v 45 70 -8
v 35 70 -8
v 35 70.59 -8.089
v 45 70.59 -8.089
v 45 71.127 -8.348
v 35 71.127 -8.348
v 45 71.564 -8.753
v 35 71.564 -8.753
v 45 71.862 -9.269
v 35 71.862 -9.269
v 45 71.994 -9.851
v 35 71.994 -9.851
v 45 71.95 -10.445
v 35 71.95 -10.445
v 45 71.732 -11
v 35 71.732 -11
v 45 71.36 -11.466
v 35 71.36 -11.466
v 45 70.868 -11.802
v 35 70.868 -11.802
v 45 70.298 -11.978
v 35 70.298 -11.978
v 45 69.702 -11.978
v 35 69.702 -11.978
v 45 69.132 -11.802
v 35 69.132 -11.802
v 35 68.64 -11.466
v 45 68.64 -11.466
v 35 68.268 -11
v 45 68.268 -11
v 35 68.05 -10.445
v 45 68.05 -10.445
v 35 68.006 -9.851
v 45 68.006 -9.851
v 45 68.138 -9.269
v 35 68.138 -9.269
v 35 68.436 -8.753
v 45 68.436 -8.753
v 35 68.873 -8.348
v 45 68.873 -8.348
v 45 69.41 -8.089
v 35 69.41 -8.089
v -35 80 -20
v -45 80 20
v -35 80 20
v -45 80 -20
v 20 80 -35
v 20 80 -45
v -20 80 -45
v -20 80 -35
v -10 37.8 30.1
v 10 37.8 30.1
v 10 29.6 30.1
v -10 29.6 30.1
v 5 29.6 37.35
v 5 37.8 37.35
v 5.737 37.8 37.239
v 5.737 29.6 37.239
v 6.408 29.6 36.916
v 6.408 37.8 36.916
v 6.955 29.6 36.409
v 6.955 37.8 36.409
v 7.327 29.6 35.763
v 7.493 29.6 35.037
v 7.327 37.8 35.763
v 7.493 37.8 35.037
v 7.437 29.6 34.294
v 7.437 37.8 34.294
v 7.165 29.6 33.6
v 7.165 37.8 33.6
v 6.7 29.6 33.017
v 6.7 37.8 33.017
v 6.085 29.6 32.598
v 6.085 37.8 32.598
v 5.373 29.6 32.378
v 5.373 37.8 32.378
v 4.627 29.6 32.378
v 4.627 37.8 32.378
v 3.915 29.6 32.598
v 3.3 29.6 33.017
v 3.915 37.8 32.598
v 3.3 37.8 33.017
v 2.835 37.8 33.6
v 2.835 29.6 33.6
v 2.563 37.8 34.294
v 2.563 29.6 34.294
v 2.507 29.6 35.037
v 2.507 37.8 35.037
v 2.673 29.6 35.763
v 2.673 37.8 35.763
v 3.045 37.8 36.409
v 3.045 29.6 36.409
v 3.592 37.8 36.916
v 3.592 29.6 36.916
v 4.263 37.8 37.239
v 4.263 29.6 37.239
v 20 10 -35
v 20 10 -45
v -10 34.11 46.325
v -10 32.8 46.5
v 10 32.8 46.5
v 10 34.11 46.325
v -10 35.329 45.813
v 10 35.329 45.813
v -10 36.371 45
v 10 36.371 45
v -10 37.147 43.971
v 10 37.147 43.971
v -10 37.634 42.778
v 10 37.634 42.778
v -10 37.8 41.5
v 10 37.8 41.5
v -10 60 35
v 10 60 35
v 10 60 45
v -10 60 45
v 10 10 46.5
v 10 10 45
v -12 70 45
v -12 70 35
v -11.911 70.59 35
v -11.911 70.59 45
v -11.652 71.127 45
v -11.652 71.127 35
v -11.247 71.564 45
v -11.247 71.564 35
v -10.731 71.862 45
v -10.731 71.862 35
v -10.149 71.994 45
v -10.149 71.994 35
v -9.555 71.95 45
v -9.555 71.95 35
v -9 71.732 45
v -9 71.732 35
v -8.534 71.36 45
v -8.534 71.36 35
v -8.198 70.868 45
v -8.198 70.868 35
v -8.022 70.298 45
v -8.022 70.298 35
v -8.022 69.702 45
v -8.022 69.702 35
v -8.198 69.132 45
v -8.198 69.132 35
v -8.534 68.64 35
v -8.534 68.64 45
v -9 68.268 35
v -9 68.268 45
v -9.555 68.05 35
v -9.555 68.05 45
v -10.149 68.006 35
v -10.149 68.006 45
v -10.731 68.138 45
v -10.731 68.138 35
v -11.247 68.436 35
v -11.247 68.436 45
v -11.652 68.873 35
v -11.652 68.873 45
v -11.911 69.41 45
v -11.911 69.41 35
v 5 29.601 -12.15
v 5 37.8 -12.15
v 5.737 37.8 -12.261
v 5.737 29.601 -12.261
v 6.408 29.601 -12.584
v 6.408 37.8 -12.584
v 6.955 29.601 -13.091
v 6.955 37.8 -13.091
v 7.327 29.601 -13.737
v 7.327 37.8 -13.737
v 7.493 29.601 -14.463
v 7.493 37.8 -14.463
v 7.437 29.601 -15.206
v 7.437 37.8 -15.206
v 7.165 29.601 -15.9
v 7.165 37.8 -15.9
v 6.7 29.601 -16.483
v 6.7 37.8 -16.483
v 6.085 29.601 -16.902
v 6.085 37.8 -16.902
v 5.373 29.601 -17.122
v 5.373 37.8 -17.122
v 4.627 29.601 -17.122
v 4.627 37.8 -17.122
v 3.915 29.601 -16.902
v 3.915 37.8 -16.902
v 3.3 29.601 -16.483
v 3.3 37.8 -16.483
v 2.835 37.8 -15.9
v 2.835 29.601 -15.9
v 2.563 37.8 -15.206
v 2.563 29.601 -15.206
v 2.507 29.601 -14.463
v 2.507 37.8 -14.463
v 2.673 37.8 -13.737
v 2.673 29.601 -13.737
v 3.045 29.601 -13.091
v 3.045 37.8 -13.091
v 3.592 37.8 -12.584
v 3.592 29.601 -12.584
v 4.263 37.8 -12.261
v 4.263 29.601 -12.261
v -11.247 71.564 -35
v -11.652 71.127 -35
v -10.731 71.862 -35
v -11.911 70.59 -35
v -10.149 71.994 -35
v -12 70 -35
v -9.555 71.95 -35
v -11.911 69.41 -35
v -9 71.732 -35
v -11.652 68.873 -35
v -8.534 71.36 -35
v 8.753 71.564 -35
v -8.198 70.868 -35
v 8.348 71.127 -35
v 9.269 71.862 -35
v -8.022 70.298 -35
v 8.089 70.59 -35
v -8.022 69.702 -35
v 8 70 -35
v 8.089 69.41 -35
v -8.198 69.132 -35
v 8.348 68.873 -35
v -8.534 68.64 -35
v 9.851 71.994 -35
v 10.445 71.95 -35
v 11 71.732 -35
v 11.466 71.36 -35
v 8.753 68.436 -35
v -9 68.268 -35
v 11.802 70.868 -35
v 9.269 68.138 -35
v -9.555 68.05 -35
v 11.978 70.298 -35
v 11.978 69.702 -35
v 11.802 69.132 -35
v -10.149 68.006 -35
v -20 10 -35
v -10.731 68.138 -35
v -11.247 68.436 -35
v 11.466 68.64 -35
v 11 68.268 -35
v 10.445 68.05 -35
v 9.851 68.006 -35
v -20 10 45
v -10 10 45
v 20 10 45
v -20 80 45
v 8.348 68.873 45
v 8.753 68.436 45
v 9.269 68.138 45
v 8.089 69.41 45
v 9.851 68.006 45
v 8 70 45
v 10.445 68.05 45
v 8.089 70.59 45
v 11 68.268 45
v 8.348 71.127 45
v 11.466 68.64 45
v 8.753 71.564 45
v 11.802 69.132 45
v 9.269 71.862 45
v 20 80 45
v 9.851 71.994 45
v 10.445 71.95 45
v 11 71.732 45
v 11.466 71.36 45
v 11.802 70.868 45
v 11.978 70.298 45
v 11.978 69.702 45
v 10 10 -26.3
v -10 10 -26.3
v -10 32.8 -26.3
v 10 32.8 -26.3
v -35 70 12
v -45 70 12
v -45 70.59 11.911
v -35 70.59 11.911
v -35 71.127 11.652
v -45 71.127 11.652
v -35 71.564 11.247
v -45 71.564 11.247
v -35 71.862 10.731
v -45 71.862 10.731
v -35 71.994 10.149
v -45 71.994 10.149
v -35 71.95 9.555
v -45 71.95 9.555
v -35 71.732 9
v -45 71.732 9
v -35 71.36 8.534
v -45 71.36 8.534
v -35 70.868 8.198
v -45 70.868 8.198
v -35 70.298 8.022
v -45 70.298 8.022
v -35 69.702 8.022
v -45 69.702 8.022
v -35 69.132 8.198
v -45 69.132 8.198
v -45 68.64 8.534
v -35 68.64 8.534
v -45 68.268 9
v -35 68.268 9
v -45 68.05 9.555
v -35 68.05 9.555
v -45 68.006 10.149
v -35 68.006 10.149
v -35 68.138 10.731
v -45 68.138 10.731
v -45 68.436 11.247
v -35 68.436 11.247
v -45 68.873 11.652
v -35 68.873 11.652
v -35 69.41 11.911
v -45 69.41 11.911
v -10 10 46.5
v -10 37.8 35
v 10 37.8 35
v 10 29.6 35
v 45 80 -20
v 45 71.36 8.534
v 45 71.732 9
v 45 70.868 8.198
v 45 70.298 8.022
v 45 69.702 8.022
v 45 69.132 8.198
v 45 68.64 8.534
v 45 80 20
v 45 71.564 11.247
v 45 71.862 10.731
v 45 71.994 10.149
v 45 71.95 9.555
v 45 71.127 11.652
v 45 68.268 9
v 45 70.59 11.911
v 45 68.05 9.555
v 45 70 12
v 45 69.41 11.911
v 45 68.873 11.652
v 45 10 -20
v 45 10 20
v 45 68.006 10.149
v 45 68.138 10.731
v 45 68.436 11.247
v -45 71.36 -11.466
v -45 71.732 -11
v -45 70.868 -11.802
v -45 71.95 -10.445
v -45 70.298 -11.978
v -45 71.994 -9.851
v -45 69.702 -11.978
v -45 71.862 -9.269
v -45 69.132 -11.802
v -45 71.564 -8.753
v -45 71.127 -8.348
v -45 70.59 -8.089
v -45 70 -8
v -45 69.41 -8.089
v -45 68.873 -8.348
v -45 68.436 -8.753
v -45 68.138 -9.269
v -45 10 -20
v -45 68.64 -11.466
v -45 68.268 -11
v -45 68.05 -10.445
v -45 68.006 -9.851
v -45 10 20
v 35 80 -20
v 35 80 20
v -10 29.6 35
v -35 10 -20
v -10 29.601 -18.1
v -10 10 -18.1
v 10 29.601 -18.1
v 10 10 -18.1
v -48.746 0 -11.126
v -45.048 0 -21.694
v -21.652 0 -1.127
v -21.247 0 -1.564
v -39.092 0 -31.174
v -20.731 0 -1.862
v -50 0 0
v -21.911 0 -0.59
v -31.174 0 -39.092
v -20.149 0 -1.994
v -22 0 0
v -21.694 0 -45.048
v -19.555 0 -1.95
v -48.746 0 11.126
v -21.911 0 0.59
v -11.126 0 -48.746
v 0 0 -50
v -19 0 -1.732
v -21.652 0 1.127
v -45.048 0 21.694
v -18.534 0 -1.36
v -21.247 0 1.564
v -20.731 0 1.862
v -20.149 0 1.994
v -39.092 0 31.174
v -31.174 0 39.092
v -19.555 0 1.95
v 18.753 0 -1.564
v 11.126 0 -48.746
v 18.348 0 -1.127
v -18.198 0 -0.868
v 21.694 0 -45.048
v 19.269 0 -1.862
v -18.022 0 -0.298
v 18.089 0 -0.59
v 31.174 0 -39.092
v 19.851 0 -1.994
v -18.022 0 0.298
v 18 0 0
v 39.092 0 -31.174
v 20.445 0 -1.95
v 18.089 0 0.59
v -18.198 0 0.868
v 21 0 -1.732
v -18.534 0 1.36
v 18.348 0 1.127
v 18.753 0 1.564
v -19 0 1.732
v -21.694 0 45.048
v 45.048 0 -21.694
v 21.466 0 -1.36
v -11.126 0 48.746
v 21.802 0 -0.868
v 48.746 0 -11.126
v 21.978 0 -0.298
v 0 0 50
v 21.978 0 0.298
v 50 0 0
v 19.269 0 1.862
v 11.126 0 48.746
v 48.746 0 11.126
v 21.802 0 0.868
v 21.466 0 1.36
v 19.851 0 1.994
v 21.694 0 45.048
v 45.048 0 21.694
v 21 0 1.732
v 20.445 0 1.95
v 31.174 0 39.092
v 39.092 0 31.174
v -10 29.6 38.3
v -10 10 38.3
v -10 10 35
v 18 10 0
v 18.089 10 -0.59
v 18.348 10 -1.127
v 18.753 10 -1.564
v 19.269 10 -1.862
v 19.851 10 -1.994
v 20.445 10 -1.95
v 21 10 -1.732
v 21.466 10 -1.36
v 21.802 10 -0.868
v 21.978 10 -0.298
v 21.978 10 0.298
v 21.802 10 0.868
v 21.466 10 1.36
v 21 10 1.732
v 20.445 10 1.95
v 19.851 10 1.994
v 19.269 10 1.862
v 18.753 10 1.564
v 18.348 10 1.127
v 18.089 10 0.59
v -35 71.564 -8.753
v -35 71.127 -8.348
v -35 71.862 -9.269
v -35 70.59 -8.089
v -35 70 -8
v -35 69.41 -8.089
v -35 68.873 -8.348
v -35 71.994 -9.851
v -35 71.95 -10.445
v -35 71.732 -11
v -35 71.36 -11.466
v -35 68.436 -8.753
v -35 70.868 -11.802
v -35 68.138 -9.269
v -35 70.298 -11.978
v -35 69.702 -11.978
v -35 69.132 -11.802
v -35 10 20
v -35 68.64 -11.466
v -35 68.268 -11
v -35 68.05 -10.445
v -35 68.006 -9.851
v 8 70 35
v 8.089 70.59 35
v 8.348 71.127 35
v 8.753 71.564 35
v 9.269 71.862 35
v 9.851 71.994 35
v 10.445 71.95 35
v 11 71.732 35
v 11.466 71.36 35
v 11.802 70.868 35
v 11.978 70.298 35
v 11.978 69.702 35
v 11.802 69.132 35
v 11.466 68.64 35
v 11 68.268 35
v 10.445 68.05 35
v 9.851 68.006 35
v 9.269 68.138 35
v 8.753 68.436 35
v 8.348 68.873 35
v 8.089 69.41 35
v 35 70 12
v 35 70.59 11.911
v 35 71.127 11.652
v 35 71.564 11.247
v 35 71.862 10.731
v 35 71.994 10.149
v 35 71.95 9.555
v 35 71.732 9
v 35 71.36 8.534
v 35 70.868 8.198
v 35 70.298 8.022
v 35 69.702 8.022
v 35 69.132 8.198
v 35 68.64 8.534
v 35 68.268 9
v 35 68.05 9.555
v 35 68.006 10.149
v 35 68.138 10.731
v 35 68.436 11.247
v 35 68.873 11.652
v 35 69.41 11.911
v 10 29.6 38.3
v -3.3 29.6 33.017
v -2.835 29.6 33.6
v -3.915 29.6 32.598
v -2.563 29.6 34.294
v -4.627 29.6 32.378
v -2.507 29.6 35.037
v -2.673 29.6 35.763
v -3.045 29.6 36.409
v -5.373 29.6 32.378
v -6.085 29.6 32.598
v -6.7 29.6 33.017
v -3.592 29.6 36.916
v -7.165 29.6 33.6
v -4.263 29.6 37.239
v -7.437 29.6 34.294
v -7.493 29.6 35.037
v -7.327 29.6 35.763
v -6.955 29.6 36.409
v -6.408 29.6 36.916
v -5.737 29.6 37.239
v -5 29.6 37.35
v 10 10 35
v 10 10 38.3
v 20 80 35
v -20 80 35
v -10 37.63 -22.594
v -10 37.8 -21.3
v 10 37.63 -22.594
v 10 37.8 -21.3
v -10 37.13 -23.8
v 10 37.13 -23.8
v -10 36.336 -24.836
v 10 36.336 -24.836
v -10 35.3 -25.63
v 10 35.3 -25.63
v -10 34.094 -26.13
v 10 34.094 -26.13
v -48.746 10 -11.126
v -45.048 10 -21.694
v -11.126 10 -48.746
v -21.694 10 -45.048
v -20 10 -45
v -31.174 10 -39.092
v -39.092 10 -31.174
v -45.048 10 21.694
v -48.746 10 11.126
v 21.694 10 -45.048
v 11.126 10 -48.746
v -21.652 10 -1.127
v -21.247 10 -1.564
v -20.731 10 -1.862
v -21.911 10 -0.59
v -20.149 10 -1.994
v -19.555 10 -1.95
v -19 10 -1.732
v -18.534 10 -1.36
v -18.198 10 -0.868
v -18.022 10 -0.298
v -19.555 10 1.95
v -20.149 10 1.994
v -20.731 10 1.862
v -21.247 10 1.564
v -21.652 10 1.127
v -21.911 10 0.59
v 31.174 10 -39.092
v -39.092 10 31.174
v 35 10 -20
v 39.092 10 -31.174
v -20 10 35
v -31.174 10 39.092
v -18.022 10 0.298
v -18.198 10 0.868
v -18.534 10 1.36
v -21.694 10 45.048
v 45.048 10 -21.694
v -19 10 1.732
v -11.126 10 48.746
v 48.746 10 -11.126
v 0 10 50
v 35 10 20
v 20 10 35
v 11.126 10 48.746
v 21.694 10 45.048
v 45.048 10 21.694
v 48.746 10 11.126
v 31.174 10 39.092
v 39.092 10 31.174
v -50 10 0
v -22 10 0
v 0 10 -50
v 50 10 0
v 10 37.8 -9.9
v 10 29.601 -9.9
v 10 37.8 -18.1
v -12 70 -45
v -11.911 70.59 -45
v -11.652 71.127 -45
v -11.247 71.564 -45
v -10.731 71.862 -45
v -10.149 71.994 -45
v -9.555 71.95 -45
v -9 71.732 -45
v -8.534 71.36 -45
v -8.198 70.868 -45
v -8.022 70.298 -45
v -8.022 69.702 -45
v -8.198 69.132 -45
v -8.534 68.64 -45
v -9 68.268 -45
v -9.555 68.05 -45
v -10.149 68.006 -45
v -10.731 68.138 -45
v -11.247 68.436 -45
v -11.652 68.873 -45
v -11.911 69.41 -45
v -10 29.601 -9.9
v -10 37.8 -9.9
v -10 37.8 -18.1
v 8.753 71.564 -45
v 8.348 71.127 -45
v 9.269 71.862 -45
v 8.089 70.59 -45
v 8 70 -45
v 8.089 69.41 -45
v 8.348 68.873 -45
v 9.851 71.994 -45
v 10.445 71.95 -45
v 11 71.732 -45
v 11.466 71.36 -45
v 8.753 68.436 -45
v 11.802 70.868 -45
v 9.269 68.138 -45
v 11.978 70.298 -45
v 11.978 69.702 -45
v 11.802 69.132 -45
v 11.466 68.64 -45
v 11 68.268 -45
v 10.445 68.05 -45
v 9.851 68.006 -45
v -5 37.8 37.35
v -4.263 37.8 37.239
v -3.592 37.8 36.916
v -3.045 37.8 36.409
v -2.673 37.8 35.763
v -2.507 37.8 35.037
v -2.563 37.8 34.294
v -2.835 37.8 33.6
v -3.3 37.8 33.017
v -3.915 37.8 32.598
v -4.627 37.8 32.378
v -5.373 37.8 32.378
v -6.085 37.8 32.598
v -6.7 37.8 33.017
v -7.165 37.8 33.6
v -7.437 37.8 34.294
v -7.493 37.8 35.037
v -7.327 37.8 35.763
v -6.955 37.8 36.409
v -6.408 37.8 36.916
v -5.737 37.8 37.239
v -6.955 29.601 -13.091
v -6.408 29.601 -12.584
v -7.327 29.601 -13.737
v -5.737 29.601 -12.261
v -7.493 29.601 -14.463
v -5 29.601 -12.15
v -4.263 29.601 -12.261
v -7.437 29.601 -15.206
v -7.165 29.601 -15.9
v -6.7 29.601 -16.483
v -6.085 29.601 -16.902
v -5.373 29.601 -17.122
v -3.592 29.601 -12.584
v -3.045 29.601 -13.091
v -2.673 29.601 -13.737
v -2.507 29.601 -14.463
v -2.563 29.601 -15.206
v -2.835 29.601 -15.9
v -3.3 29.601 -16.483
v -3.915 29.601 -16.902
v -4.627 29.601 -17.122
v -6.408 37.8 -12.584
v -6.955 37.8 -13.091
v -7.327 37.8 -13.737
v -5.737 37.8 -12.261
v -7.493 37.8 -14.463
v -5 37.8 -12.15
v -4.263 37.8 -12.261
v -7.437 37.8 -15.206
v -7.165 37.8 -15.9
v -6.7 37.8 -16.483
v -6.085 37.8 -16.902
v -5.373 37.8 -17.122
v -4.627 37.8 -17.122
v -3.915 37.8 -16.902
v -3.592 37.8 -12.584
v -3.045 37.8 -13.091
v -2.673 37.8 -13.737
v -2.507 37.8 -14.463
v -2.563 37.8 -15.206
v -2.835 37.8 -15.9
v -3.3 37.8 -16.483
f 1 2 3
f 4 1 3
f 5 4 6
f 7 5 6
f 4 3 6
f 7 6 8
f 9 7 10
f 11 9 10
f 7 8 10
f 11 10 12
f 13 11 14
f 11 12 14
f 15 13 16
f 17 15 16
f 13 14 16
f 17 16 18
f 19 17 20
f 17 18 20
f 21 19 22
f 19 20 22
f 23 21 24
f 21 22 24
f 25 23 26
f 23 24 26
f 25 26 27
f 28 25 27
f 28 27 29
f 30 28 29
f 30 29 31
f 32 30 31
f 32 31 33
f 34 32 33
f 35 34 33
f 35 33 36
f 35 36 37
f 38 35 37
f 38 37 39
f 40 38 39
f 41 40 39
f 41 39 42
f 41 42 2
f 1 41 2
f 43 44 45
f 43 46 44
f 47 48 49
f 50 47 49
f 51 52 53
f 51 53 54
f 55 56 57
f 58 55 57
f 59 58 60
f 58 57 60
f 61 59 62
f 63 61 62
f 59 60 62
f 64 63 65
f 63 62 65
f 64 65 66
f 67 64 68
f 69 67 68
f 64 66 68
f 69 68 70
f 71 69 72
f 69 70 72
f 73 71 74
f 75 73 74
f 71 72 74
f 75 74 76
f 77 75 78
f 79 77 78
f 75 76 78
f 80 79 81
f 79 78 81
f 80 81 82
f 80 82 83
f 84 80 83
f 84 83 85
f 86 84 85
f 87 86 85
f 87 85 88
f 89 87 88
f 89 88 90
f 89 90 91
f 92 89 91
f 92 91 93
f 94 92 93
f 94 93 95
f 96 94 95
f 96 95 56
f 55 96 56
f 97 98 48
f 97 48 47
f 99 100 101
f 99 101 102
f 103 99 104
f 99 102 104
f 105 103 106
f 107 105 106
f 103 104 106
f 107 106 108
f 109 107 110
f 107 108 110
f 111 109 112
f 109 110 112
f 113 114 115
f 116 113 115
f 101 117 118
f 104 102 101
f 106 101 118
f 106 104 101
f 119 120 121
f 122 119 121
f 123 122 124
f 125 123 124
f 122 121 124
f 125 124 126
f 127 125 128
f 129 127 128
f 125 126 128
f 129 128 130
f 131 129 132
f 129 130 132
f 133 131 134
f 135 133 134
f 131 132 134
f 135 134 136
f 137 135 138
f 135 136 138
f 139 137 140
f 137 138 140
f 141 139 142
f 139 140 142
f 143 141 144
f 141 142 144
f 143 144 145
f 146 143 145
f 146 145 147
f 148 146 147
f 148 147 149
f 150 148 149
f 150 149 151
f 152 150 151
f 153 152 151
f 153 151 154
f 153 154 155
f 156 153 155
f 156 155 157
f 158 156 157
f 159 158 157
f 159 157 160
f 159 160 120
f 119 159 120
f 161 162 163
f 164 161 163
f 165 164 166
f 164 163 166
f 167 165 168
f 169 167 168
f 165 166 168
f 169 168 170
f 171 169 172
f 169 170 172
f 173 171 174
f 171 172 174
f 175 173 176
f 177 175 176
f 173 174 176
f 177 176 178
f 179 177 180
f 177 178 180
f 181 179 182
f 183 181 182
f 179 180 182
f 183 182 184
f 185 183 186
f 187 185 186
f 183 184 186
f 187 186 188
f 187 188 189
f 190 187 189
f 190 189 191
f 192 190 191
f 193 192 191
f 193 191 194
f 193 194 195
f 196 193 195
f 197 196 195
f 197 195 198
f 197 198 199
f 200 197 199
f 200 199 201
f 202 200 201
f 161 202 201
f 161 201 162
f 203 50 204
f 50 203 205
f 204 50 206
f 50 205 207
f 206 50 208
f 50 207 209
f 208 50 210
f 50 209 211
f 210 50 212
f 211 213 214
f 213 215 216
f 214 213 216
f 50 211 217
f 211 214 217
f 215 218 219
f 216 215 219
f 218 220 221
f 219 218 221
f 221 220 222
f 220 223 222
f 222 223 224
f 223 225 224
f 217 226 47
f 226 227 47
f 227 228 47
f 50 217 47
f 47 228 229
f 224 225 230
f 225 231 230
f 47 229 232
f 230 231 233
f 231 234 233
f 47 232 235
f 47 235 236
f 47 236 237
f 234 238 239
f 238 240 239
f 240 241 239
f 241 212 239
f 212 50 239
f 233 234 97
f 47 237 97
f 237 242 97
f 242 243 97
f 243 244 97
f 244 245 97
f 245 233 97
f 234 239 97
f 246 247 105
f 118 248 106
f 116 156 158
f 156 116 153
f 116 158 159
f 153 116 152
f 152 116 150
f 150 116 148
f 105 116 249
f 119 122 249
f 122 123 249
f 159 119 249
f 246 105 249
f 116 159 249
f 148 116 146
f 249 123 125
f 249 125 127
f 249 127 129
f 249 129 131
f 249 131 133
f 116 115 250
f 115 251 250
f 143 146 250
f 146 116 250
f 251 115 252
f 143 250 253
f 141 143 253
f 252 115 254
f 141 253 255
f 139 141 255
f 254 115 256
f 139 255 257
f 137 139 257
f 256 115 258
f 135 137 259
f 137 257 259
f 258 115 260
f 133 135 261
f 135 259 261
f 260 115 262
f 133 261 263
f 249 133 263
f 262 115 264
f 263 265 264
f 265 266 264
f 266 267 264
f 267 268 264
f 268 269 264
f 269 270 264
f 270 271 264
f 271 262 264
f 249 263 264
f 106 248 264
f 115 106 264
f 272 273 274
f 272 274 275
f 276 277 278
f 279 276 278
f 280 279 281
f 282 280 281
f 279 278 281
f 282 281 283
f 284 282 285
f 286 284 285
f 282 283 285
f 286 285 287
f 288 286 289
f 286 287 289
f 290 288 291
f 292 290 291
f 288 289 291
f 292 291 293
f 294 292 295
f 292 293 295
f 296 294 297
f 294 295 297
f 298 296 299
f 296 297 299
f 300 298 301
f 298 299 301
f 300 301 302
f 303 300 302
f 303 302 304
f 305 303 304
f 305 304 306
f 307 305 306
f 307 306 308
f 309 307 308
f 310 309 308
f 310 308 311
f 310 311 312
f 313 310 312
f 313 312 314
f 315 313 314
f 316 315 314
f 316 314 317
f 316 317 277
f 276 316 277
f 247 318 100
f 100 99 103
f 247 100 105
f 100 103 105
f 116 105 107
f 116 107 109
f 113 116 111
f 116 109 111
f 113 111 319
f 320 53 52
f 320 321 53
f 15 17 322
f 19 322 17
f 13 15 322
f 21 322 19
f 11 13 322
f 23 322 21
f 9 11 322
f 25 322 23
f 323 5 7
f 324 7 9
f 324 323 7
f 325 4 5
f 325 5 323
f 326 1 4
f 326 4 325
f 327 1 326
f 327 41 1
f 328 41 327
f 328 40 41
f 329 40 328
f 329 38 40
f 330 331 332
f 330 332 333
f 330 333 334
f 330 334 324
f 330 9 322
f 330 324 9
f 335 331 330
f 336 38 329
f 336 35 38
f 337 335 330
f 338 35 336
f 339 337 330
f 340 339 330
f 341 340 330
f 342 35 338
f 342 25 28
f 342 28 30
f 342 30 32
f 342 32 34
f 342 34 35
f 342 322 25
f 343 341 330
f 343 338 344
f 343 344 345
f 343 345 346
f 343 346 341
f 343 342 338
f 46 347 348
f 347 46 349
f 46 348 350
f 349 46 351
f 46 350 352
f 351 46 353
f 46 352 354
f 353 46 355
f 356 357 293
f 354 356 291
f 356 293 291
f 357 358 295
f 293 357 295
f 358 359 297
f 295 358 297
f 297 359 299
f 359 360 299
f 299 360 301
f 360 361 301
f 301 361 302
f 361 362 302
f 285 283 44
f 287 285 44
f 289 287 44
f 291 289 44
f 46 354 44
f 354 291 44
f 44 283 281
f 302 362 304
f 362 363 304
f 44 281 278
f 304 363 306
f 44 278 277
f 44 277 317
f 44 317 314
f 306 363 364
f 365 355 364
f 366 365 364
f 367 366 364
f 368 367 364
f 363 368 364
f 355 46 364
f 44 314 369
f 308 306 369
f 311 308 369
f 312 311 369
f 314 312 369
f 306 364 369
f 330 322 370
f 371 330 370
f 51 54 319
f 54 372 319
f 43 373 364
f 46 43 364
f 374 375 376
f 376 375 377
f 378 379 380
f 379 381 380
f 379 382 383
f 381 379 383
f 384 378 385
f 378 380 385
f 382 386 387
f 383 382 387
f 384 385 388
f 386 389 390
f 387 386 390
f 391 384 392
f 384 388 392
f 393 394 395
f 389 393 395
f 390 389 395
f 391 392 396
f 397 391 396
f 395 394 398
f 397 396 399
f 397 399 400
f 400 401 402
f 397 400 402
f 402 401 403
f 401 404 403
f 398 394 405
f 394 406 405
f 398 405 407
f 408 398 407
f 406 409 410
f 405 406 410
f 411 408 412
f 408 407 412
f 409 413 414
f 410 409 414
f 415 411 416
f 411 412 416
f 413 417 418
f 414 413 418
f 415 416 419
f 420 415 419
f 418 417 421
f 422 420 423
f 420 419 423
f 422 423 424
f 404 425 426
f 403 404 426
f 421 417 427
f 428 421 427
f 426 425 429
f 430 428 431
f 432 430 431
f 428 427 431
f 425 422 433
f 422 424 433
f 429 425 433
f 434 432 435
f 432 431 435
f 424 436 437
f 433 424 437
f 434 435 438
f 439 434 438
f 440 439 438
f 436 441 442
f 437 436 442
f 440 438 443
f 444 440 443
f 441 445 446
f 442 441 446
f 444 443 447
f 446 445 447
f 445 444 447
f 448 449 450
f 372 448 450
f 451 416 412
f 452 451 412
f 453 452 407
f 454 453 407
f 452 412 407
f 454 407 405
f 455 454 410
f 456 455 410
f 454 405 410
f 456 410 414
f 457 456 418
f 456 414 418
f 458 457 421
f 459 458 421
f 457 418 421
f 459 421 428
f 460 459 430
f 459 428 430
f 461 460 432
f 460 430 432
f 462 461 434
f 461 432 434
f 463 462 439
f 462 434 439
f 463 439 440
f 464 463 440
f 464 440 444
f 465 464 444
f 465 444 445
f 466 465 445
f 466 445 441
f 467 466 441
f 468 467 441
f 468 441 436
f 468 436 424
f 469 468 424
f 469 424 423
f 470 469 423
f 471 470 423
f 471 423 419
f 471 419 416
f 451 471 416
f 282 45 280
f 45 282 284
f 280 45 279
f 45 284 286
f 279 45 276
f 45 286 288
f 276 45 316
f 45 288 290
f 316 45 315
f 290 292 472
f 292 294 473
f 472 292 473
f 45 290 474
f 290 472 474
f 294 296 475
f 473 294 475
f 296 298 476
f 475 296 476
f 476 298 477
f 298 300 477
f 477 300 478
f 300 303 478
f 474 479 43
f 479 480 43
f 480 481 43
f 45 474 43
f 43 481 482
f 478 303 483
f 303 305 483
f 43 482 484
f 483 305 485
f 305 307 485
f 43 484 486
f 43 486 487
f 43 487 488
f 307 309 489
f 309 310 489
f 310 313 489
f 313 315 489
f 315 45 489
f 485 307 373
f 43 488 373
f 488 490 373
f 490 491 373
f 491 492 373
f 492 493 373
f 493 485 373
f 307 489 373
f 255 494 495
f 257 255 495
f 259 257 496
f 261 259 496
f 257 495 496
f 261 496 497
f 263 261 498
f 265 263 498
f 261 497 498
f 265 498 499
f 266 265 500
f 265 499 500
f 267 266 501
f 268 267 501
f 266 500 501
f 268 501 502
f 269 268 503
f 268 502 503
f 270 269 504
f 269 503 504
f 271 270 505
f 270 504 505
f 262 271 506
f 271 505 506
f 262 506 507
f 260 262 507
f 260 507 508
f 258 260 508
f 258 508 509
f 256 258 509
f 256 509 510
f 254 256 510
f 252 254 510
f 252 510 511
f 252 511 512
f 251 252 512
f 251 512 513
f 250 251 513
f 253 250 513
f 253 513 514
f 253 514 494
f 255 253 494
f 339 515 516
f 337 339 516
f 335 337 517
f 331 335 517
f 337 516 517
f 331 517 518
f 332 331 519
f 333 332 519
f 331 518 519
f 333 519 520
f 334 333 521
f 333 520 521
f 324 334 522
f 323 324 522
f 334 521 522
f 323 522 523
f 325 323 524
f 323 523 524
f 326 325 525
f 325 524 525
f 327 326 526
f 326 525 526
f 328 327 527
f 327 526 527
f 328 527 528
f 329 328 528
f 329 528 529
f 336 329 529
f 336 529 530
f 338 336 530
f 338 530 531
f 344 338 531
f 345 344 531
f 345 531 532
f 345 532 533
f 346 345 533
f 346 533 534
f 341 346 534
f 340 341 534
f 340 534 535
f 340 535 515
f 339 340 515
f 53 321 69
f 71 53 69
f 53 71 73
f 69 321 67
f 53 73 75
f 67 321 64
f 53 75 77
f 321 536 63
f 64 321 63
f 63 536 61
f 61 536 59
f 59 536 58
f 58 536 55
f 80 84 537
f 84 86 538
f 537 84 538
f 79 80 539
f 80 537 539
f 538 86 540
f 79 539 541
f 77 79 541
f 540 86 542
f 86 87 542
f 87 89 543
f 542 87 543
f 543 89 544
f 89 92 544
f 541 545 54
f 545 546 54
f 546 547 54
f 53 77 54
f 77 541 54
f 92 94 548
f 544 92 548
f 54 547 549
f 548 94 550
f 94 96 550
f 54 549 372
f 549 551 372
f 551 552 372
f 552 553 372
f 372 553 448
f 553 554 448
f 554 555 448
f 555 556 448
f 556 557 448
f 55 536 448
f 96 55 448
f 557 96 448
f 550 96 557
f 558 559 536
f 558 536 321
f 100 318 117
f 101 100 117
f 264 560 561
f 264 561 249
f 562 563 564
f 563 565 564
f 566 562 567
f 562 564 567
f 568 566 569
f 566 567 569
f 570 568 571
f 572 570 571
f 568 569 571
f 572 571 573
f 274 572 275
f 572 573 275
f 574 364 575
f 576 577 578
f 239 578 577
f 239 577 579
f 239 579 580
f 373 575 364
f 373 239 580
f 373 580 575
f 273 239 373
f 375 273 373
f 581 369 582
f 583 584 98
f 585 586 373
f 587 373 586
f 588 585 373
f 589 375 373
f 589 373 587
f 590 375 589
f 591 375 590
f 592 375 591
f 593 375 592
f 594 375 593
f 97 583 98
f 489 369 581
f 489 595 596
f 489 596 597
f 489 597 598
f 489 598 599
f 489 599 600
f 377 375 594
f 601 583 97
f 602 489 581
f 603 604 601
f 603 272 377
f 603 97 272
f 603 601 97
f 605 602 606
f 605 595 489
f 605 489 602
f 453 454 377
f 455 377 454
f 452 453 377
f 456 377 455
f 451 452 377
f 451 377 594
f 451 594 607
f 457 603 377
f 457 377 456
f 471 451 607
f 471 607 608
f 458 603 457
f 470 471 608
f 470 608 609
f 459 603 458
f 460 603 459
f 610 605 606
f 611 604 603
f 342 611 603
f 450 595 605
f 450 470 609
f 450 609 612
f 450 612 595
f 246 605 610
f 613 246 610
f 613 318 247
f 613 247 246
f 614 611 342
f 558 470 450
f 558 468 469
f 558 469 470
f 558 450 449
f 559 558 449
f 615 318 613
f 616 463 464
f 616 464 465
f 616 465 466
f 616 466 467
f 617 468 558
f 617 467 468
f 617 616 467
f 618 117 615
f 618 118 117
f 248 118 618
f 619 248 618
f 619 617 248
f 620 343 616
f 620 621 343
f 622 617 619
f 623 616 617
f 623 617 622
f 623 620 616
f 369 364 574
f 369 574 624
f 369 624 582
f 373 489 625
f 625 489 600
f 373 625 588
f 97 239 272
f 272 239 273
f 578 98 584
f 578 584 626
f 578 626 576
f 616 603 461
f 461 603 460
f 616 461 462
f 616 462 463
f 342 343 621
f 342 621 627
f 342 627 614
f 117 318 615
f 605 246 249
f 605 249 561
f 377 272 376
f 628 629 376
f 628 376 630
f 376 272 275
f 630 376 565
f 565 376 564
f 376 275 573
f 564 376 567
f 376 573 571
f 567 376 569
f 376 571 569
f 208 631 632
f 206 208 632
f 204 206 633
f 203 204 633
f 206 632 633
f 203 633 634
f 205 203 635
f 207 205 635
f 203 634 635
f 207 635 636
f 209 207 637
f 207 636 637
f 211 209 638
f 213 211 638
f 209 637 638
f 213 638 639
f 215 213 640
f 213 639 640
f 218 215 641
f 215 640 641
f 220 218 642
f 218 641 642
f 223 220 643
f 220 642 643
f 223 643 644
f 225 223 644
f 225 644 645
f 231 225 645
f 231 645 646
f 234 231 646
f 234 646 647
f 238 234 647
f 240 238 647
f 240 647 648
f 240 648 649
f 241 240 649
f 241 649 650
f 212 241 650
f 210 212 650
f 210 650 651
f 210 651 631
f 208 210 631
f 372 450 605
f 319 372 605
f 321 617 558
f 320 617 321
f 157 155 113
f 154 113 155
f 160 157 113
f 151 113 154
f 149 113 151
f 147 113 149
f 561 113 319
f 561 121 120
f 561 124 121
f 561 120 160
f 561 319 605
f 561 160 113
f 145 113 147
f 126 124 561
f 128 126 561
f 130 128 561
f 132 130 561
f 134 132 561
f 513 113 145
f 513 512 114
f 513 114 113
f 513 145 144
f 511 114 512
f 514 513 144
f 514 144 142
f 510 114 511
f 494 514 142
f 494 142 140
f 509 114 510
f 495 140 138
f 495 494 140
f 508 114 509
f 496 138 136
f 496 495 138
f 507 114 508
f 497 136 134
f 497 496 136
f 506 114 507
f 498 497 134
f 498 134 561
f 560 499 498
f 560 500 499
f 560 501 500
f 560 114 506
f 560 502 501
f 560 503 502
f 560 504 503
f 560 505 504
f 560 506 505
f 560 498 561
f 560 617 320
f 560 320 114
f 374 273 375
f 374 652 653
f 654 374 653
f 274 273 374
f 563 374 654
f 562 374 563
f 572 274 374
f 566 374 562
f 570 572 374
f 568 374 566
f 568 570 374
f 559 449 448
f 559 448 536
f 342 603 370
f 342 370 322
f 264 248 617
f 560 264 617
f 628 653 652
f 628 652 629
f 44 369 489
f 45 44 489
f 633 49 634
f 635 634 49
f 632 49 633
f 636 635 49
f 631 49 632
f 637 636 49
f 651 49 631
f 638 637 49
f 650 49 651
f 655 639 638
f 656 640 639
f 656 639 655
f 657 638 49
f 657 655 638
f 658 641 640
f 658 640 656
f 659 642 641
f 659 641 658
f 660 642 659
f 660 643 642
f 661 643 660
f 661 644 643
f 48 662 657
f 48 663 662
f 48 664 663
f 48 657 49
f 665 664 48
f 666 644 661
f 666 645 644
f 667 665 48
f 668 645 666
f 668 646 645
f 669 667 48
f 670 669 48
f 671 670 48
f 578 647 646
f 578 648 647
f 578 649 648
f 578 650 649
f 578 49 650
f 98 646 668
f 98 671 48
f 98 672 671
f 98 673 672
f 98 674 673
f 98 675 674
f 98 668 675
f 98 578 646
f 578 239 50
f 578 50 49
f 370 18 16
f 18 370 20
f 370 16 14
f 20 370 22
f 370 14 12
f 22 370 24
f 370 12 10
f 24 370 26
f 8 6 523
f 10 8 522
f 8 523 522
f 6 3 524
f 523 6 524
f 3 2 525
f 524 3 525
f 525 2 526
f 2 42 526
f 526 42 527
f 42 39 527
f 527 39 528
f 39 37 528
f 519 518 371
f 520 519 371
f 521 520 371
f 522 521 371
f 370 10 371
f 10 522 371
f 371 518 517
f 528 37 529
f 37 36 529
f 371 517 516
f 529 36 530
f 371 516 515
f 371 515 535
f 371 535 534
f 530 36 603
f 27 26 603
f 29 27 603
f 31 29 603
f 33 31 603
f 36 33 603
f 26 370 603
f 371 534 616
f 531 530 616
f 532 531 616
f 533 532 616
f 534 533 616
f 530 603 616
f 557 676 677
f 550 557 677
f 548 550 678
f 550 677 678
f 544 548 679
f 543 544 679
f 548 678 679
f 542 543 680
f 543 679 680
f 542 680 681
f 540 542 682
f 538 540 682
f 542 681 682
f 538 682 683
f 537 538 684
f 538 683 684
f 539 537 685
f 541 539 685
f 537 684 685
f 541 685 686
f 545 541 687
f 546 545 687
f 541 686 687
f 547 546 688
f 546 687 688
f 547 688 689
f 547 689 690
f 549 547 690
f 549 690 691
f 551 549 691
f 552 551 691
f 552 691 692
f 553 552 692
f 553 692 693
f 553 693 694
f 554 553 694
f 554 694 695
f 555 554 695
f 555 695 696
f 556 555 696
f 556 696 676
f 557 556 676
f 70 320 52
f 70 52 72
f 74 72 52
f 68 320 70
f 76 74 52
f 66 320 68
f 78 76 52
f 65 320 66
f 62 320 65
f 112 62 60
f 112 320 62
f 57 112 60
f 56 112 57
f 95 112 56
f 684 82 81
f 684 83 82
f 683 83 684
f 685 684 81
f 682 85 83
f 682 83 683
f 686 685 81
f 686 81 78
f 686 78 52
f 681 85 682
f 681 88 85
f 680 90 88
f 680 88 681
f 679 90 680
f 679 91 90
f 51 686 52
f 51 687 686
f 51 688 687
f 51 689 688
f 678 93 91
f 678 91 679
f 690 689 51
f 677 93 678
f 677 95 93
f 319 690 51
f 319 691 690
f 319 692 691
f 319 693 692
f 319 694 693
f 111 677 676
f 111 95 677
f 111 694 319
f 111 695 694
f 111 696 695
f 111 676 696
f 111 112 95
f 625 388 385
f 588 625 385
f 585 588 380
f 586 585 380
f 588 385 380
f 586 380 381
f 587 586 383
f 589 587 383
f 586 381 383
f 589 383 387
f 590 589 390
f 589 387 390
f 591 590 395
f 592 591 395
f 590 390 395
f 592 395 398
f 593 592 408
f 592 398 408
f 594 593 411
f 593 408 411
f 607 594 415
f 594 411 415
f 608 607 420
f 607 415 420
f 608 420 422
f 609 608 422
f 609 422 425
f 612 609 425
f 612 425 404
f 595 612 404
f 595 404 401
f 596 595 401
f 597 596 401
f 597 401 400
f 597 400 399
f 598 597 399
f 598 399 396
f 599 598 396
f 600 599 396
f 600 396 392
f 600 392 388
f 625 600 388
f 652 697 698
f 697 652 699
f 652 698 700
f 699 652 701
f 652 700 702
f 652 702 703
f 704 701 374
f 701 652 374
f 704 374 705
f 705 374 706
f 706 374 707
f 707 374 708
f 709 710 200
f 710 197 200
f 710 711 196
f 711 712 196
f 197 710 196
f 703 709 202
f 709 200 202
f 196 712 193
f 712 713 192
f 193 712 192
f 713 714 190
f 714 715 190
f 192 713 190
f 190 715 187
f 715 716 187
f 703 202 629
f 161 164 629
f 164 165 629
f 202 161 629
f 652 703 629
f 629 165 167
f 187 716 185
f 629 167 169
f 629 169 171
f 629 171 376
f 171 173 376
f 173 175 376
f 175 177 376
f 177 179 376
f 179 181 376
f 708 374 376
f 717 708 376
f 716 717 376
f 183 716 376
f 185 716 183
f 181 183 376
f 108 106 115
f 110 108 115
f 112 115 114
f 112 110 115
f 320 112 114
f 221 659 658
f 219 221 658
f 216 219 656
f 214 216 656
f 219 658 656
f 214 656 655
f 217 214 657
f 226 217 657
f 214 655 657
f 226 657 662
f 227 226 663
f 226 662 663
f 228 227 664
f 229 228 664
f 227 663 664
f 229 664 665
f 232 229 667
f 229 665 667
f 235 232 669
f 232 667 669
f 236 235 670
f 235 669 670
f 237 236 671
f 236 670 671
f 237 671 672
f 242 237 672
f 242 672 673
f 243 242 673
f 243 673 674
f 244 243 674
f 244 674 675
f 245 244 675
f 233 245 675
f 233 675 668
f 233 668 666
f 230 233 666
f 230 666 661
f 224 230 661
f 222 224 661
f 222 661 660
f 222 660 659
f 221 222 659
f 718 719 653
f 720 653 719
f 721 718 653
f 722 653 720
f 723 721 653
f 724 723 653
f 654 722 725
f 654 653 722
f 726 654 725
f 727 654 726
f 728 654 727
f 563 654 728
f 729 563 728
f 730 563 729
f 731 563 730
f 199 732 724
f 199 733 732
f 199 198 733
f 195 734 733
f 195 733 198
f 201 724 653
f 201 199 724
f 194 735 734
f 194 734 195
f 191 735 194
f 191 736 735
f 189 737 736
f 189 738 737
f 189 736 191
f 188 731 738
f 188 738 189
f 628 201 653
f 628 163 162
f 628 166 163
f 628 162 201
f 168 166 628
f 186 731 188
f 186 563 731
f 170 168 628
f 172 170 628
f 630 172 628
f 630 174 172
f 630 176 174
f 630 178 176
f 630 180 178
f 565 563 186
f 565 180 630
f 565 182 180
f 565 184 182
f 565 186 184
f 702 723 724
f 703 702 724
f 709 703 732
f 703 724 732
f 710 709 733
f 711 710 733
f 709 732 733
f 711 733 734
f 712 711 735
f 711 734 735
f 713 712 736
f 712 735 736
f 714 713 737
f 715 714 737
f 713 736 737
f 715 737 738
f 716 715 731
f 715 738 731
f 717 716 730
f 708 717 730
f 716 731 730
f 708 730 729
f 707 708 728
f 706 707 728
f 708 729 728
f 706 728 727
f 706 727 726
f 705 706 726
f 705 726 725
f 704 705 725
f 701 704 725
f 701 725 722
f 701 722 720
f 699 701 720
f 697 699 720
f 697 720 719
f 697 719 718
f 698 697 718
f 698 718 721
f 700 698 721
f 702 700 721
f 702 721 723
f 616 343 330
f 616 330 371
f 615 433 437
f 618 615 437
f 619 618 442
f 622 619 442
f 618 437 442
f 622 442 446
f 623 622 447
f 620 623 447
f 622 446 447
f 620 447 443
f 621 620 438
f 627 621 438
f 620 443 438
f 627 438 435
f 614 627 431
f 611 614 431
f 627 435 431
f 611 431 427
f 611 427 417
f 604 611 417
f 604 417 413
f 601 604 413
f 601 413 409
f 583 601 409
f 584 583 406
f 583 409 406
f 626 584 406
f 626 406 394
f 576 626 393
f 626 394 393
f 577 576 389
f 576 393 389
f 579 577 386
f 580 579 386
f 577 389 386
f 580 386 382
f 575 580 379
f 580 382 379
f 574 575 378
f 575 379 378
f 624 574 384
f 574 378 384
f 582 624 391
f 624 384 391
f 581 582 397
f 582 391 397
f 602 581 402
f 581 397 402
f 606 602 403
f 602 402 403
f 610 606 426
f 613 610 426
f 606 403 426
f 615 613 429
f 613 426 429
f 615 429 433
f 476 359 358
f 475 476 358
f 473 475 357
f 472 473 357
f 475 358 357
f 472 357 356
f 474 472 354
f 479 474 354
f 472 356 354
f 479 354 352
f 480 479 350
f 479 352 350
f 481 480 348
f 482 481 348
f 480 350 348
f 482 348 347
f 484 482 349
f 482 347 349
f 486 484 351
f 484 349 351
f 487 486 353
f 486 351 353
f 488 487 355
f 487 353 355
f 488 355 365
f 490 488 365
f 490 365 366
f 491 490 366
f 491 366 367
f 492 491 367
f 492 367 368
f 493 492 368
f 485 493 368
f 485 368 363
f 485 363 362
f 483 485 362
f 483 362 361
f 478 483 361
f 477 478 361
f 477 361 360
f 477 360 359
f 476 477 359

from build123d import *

# Parameters (mm, degrees)
SKETCH1_R                = 50
BOSS_EXTRUDE1_DEPTH      = 10
SKETCH2_W                = 20
SKETCH2_H                = 8.2
BOSS_EXTRUDE2_DEPTH      = 27.8
SKETCH3_W                = 20
SKETCH3_H                = 8.2
BOSS_EXTRUDE3_DEPTH      = 8.2
SKETCH4_W                = 20
SKETCH4_H                = 8.199243263
BOSS_EXTRUDE4_DEPTH      = 8.2
FILLET1_R                = 5
SKETCH7_R                = 2.5
CUT_EXTRUDE1_DEPTH       = 9
SKETCH5_W                = 10
SKETCH5_H                = 10
BOSS_EXTRUDE5_DEPTH      = 70
BOSS_EXTRUDE6_REACH      = 113.803
SKETCH8_W                = 10
SKETCH8_H                = 20
F_4_0_4_DIAMETER_HOLE1_D = 4
F_4_0_4_DIAMETER_HOLE2_D = 4
F_4_0_4_DIAMETER_HOLE3_D = 4


with BuildPart() as part:
    # Sketch1 → Boss-Extrude1 (new body)
    with BuildSketch(Plane(origin=(0, 0, 0), x_dir=(1, 0, 0), z_dir=(0, 1, 0))):
        with Locations(Location((0, 0, 0), (0, 0, 270))):
            Circle(SKETCH1_R)
    extrude(amount=BOSS_EXTRUDE1_DEPTH)

    # Sketch2 → Boss-Extrude2 (add)
    with BuildSketch(Plane(origin=(0, 10, 0), x_dir=(1, 0, 0), z_dir=(0, 1, 0))):
        with Locations((0, -42.4)):
            Rectangle(SKETCH2_W, SKETCH2_H)
        with Locations((0, 22.2)):
            Rectangle(SKETCH2_W, SKETCH2_H)
    extrude(amount=BOSS_EXTRUDE2_DEPTH)

    # Sketch3 → Boss-Extrude3 (add)
    with BuildSketch(Plane(origin=(0, 0, 38.3), x_dir=(-1, 0, 0), z_dir=(0, 0, -1))):
        with Locations((0, 33.7)):
            Rectangle(SKETCH3_W, SKETCH3_H)
    extrude(amount=BOSS_EXTRUDE3_DEPTH)

    # Sketch4 → Boss-Extrude4 (add)
    with BuildSketch(Plane.XY.offset(-18.1)):
        with Locations((0, 33.700378369)):
            Rectangle(SKETCH4_W, SKETCH4_H)
    extrude(amount=BOSS_EXTRUDE4_DEPTH)

    # Fillet1
    fillet1_edges = [part.edges().sort_by_distance(p)[0] for p in [
        (0, 37.8, -26.3),
        (0, 37.8, 46.5),
    ]]
    fillet(fillet1_edges, radius=FILLET1_R)

    # Sketch7 → Cut-Extrude1 (cut)
    with BuildSketch(Plane(origin=(0, 37.8, 0), x_dir=(1, 0, 0), z_dir=(0, 1, 0))):
        with Locations(Location((5, 14.65, 0), (0, 0, 270))):
            Circle(SKETCH7_R)
        with Locations(Location((-5, 14.65, 0), (0, 0, 270))):
            Circle(SKETCH7_R)
        with Locations(Location((-5, -34.85, 0), (0, 0, 270))):
            Circle(SKETCH7_R)
        with Locations(Location((5, -34.85, 0), (0, 0, 270))):
            Circle(SKETCH7_R)
    extrude(amount=-CUT_EXTRUDE1_DEPTH, mode=Mode.SUBTRACT)

    # Sketch5 → Boss-Extrude5 (add)
    with BuildSketch(Plane(origin=(0, 10, 0), x_dir=(1, 0, 0), z_dir=(0, 1, 0))):
        Polygon((35, 0), (35, 20), (45, 20), (45, -20), (35, -20), align=None)
        Polygon((-45, -20), (-35, -20), (-35, 0), (-35, 20), (-45, 20), align=None)
        with Locations((-15, -40)):
            Rectangle(SKETCH5_W, SKETCH5_H)
        with Locations((15, -40)):
            Rectangle(SKETCH5_W, SKETCH5_H)
        Polygon((-20, 35), (-20, 45), (20, 45), (20, 35), (0, 35), align=None)
    extrude(amount=BOSS_EXTRUDE5_DEPTH)

    # Sketch8 → Boss-Extrude6 (add, up to next)
    with BuildSketch(Plane.ZY.offset(-10), mode=Mode.PRIVATE) as boss_extrude6_sk1:
        with Locations((40, 70)):
            Rectangle(SKETCH8_W, SKETCH8_H)
    boss_extrude6_tool1 = extrude(boss_extrude6_sk1.sketch, amount=BOSS_EXTRUDE6_REACH, mode=Mode.PRIVATE) - part.part
    add(boss_extrude6_tool1.solids().sort_by_distance((10, 70, 40))[0])

    # Ø4.0 (4) Diameter Hole1 (through all)
    with Locations(Plane.XY.offset(45)):
        with Locations((-10, 70), (10, 70)):
            Hole(F_4_0_4_DIAMETER_HOLE1_D / 2)

    # Ø4.0 (4) Diameter Hole2 (through all)
    with Locations(Plane(origin=(45, 0, 0), x_dir=(0, 0, -1), z_dir=(1, 0, 0))):
        with Locations((-10, 70), (10, 70)):
            Hole(F_4_0_4_DIAMETER_HOLE2_D / 2)

    # Ø4.0 (4) Diameter Hole3 (through all)
    with Locations(Plane(origin=(0, 10, 0), x_dir=(1, 0, 0), z_dir=(0, 1, 0))):
        with Locations((-20, 0), (20, 0)):
            Hole(F_4_0_4_DIAMETER_HOLE3_D / 2)


solid = part.part
